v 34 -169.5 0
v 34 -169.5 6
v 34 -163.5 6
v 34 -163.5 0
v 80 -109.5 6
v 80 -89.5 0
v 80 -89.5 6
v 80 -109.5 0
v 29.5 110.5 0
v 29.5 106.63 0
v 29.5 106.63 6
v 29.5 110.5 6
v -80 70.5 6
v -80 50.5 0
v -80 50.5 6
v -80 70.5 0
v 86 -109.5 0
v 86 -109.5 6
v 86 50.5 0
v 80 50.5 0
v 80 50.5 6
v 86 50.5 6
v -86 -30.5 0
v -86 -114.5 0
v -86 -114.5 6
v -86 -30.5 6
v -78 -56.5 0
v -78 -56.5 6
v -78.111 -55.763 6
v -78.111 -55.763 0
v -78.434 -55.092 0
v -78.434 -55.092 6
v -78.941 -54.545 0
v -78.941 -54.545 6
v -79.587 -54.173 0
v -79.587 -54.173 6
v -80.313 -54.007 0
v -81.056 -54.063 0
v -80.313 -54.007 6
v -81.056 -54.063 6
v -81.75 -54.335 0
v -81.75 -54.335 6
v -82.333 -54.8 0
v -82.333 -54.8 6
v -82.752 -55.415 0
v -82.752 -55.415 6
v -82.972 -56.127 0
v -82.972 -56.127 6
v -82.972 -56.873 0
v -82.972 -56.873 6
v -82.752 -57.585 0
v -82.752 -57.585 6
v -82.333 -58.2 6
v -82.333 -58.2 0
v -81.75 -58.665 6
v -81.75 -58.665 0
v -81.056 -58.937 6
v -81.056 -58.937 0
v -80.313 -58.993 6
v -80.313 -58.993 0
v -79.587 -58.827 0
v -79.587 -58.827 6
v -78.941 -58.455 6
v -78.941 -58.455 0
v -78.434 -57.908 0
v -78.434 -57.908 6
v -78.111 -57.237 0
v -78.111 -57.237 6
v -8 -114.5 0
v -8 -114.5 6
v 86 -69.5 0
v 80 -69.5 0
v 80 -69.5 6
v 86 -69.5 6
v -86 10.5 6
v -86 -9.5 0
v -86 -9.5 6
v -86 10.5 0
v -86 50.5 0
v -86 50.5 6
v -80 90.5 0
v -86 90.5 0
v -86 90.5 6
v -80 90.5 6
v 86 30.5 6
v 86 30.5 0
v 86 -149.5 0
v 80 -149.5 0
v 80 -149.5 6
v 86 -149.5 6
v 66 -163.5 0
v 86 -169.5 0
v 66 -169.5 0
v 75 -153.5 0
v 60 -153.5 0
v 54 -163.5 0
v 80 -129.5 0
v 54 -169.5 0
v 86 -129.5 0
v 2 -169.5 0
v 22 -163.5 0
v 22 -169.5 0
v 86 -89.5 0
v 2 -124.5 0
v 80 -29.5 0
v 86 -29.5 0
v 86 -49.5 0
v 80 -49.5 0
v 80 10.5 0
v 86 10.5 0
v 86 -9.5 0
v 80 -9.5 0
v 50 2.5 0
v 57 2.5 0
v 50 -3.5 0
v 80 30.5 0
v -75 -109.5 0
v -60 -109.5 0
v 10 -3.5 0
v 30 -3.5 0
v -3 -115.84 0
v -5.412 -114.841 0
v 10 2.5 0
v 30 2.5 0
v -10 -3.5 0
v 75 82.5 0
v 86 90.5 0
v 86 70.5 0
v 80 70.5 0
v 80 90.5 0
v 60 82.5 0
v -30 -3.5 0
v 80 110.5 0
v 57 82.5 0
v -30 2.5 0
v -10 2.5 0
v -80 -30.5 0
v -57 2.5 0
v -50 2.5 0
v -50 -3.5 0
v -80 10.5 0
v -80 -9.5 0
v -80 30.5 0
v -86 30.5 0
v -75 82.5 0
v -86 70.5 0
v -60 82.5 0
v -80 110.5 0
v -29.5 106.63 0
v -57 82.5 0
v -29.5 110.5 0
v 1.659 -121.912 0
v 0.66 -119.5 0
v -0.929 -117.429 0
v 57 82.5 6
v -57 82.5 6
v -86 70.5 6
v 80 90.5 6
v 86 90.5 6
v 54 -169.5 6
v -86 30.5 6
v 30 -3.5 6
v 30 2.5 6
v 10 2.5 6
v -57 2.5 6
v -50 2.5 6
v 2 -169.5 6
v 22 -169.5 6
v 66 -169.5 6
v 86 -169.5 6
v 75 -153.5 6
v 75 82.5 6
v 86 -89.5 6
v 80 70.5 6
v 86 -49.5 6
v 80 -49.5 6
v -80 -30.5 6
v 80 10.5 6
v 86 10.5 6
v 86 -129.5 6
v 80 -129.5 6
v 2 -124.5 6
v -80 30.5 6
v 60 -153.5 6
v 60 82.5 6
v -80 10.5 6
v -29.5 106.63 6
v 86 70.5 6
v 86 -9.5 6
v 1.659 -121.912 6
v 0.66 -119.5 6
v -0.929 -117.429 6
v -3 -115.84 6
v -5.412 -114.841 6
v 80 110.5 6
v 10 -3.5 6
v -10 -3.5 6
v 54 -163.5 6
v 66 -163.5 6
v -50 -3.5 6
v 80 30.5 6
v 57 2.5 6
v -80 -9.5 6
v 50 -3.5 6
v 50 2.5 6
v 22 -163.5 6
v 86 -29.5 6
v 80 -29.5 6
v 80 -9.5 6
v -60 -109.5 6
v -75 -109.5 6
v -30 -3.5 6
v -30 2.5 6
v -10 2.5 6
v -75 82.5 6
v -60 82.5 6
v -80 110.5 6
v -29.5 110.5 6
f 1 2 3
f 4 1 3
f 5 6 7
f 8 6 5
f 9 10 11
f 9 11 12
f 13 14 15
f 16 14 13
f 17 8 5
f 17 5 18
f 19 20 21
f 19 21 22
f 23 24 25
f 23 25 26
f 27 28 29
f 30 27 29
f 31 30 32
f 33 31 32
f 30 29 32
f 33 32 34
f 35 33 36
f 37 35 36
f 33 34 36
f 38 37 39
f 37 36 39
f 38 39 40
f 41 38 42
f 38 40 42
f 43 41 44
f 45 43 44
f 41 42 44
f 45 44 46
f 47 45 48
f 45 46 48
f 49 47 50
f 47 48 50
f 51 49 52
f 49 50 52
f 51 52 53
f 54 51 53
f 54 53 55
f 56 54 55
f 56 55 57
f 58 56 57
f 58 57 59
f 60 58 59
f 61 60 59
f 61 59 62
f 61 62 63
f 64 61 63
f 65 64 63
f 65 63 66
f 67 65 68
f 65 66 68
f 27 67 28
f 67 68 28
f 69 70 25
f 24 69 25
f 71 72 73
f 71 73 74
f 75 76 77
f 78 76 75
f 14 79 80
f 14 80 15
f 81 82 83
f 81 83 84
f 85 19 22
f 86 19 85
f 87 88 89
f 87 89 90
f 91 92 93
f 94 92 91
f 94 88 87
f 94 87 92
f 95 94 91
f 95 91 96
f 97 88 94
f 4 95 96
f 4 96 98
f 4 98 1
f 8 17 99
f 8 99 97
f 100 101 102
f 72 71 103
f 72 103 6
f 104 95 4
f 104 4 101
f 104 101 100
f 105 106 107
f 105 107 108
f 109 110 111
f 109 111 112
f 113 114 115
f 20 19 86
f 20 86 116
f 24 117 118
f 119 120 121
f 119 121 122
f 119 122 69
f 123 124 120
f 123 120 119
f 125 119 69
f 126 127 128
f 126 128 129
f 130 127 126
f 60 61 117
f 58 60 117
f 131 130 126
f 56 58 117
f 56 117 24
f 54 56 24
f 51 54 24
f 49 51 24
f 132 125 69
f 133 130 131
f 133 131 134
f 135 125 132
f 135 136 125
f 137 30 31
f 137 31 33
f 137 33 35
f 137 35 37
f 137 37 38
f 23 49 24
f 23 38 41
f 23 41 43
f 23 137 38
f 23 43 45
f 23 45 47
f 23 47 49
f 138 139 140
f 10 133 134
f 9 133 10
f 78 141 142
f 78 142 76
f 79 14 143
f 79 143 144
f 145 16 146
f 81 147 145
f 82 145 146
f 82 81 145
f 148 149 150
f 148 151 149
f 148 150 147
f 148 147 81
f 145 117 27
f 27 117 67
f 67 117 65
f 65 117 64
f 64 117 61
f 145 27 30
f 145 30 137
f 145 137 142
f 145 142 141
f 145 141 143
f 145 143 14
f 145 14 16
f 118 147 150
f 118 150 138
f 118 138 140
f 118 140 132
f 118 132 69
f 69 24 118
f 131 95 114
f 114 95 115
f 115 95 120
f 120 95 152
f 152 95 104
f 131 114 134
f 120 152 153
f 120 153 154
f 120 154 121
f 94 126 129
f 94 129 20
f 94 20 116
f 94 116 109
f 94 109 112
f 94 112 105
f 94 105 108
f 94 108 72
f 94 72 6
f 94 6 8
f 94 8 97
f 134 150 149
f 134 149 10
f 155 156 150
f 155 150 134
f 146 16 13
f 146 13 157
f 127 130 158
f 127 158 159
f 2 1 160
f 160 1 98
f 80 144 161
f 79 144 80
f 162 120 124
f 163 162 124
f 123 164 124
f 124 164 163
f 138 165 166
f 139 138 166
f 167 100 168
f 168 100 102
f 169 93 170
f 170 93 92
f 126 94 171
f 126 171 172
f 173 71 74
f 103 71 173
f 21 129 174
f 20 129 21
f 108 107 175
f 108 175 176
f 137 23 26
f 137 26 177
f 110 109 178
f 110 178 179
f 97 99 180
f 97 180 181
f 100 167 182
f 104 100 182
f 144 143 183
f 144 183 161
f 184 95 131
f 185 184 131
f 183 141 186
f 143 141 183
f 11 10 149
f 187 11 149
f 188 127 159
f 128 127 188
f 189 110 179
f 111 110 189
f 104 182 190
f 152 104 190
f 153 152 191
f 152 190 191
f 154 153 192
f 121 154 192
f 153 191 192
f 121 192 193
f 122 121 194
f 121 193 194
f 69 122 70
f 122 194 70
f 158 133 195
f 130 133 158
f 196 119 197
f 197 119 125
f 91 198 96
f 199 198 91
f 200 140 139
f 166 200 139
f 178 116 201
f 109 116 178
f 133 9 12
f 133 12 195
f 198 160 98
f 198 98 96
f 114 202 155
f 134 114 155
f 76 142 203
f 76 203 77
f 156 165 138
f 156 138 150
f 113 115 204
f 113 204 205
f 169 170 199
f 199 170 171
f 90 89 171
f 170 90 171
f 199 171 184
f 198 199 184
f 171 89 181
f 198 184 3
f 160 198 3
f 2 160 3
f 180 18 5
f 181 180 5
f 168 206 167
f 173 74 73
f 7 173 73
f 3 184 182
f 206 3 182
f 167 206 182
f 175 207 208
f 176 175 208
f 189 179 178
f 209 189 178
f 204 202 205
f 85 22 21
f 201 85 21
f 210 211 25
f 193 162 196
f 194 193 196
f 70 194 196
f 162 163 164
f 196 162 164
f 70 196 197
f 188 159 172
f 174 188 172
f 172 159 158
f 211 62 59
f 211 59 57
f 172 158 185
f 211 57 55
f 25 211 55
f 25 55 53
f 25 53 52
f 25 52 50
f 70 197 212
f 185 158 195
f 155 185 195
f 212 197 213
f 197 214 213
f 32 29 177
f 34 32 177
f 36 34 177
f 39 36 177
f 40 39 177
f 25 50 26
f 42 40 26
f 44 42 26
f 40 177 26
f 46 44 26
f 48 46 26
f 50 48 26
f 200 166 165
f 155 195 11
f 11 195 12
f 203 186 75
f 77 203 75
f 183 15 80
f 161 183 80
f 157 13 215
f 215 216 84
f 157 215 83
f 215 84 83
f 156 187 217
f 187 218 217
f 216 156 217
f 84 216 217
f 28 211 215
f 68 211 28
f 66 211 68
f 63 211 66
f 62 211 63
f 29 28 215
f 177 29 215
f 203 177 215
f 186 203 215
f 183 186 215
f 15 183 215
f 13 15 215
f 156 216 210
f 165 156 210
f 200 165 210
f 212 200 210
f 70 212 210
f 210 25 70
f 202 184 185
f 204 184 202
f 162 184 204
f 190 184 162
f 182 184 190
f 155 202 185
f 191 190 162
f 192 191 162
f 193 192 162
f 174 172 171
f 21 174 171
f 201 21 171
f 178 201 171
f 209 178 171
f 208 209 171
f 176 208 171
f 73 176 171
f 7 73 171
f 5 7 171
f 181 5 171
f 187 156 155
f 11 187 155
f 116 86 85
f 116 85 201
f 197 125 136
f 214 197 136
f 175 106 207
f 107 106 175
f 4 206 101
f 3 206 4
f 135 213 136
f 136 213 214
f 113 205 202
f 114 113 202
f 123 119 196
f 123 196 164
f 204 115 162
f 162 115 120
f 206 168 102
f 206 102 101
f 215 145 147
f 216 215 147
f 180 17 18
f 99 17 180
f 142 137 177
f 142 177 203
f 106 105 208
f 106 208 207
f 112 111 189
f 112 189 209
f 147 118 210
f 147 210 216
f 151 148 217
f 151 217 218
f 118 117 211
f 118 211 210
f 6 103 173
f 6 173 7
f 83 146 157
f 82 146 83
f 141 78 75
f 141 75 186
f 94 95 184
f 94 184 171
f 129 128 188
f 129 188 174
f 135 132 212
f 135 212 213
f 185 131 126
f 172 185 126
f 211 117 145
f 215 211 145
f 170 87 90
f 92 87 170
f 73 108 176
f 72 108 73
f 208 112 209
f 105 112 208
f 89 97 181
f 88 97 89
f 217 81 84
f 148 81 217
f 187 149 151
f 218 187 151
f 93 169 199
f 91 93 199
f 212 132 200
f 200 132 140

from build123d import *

# Parameters (mm, degrees)
BOSS_EXTRUDE1_DEPTH = 6
SKETCH2_W           = 15
SKETCH2_H           = 192
SKETCH2_H_2         = 236
CUT_EXTRUDE1_DEPTH  = 6
SKETCH3_W           = 114
SKETCH3_H           = 80
CUT_EXTRUDE2_DEPTH  = 6
SKETCH5_W           = 20
SKETCH5_H           = 6
CUT_EXTRUDE5_DEPTH  = 6
SKETCH6_R           = 2.5
CUT_EXTRUDE7_DEPTH  = 6
SKETCH7_W           = 59
SKETCH7_H           = 3.87
CUT_EXTRUDE8_DEPTH  = 6
CUT_EXTRUDE10_DEPTH = 6
SKETCH10_W          = 12
SKETCH10_H          = 6
CUT_EXTRUDE11_DEPTH = 6


with BuildPart() as part:
    # Sketch1 → Boss-Extrude1 (new body)
    with BuildSketch(Plane.XY):
        Polygon((-86, 90.5), (-80, 90.5), (-80, 110.5), (80, 110.5), (80, 90.5), (86, 90.5), (86, 70.5), (80, 70.5), (80, 50.5), (86, 50.5), (86, 30.5), (80, 30.5), (80, 10.5), (86, 10.5), (86, -9.5), (80, -9.5), (80, -29.5), (86, -29.5), (86, -49.5), (80, -49.5), (80, -69.5), (86, -69.5), (86, -89.5), (80, -89.5), (80, -109.5), (86, -109.5), (86, -129.5), (80, -129.5), (80, -149.5), (86, -149.5), (86, -169.5), (80, -169.5), (-86, -169.5), (-86, -30.5), (-80, -30.5), (-80, -9.5), (-86, -9.5), (-86, 10.5), (-80, 10.5), (-80, 30.5), (-86, 30.5), (-86, 50.5), (-80, 50.5), (-80, 70.5), (-86, 70.5), align=None)
    extrude(amount=BOSS_EXTRUDE1_DEPTH)

    # Sketch2 → Cut-Extrude1 (cut)
    with BuildSketch(Plane.XY):
        with Locations((-67.5, -13.5)):
            Rectangle(SKETCH2_W, SKETCH2_H)
        with Locations((67.5, -35.5)):
            Rectangle(SKETCH2_W, SKETCH2_H_2)
    extrude(amount=CUT_EXTRUDE1_DEPTH, mode=Mode.SUBTRACT)

    # Sketch3 → Cut-Extrude2 (cut)
    with BuildSketch(Plane.XY.offset(6)):
        with Locations((0, 42.5)):
            Rectangle(SKETCH3_W, SKETCH3_H)
    extrude(amount=-CUT_EXTRUDE2_DEPTH, mode=Mode.SUBTRACT)

    # Sketch5 → Cut-Extrude5 (cut)
    with BuildSketch(Plane(origin=(0, 0, 0), x_dir=(-1, 0, 0), z_dir=(0, 0, -1))):
        with Locations((40, -0.5)):
            Rectangle(SKETCH5_W, SKETCH5_H)
        with Locations((0, -0.5)):
            Rectangle(SKETCH5_W, SKETCH5_H)
        with Locations((-40, -0.5)):
            Rectangle(SKETCH5_W, SKETCH5_H)
    extrude(amount=-CUT_EXTRUDE5_DEPTH, mode=Mode.SUBTRACT)

    # Sketch6 → Cut-Extrude7 (cut)
    with BuildSketch(Plane.XY.offset(6)):
        with Locations((-80.5, -56.5)):
            Circle(SKETCH6_R)
    extrude(amount=-CUT_EXTRUDE7_DEPTH, mode=Mode.SUBTRACT)

    # Sketch7 → Cut-Extrude8 (cut)
    with BuildSketch(Plane(origin=(0, 0, 0), x_dir=(-1, 0, 0), z_dir=(0, 0, -1))):
        with Locations((0, 108.565)):
            Rectangle(SKETCH7_W, SKETCH7_H)
    extrude(amount=-CUT_EXTRUDE8_DEPTH, mode=Mode.SUBTRACT)

    # Sketch9 → Cut-Extrude10 (cut)
    with BuildSketch(Plane.XY.offset(6)):
        with BuildLine():
            Line((-86, -169.5), (2, -169.5))
            Line((2, -169.5), (2, -124.5))
            ThreePointArc((2, -124.5), (-0.928932188, -117.428932188), (-8, -114.5))
            Line((-8, -114.5), (-86, -114.5))
            Line((-86, -114.5), (-86, -169.5))
        make_face()
    extrude(amount=-CUT_EXTRUDE10_DEPTH, mode=Mode.SUBTRACT)

    # Sketch10 → Cut-Extrude11 (cut)
    with BuildSketch(Plane.XY.offset(6)):
        with Locations((28, -166.5)):
            Rectangle(SKETCH10_W, SKETCH10_H)
        with Locations((60, -166.5)):
            Rectangle(SKETCH10_W, SKETCH10_H)
    extrude(amount=-CUT_EXTRUDE11_DEPTH, mode=Mode.SUBTRACT)


solid = part.part
